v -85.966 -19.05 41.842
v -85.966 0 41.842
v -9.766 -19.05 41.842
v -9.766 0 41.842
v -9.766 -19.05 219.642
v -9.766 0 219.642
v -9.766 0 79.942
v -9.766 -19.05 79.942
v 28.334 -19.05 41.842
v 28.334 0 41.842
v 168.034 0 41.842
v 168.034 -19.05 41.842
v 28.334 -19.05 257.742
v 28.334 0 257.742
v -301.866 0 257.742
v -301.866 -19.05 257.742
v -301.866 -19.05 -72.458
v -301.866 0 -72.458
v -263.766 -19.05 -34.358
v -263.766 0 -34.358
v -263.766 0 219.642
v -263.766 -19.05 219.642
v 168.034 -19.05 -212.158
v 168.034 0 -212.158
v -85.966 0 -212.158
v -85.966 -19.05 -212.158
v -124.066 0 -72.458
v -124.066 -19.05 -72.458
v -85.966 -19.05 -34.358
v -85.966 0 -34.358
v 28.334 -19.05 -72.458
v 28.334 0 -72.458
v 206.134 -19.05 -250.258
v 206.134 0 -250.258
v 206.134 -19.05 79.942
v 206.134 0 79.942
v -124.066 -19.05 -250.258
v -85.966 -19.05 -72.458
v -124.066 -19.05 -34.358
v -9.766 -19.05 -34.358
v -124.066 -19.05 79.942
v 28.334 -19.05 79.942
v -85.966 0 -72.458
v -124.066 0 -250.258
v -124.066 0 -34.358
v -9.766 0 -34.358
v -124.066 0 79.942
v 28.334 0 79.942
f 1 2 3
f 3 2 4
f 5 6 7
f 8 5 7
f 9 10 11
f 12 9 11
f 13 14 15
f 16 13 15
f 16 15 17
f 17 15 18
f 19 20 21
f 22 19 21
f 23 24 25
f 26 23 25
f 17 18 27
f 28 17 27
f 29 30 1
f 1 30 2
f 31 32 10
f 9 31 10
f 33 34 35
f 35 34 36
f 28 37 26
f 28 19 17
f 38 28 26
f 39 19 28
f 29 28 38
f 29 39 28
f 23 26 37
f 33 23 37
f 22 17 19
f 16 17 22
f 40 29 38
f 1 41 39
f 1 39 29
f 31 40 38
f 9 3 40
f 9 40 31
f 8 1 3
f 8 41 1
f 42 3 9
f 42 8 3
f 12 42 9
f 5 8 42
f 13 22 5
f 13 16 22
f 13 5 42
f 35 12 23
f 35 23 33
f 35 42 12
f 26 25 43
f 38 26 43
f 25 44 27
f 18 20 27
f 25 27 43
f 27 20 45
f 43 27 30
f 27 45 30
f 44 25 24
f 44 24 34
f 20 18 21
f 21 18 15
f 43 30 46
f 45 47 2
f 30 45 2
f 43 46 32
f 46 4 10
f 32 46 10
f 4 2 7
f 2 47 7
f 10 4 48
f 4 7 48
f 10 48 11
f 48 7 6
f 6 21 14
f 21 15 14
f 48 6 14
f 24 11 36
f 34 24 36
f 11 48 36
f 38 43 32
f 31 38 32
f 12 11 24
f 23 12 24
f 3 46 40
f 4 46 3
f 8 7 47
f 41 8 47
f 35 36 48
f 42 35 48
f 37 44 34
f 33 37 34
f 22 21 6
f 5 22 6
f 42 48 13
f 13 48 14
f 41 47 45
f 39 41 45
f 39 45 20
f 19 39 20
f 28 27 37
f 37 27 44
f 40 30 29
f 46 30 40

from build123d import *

# Parameters (mm, degrees)
F0_W     = 76.2
F0_H     = 76.2
F1_DEPTH = 19.05


with BuildPart() as f1:
    # F0 (on Front) → F1 (new body)
    with BuildSketch(Plane.XZ):
        Polygon((28.333674, 257.741991), (-301.866326, 257.741991), (-301.866326, -72.458009), (-124.066326, -72.458009), (-124.066326, -250.258009), (206.133674, -250.258009), (206.133674, 79.941991), (28.333674, 79.941991), align=None)
        Polygon((168.033674, -212.158009), (-85.966326, -212.158009), (-85.966326, -72.458009), (28.333674, -72.458009), (28.333674, 41.841991), (168.033674, 41.841991), align=None, mode=Mode.SUBTRACT)
        with Locations((-47.866326, 3.741991)):
            Rectangle(F0_W, F0_H, mode=Mode.SUBTRACT)
        Polygon((-263.766326, -34.358009), (-263.766326, 219.641991), (-9.766326, 219.641991), (-9.766326, 79.941991), (-124.066326, 79.941991), (-124.066326, -34.358009), align=None, mode=Mode.SUBTRACT)
    extrude(amount=F1_DEPTH)


solid = f1.part
